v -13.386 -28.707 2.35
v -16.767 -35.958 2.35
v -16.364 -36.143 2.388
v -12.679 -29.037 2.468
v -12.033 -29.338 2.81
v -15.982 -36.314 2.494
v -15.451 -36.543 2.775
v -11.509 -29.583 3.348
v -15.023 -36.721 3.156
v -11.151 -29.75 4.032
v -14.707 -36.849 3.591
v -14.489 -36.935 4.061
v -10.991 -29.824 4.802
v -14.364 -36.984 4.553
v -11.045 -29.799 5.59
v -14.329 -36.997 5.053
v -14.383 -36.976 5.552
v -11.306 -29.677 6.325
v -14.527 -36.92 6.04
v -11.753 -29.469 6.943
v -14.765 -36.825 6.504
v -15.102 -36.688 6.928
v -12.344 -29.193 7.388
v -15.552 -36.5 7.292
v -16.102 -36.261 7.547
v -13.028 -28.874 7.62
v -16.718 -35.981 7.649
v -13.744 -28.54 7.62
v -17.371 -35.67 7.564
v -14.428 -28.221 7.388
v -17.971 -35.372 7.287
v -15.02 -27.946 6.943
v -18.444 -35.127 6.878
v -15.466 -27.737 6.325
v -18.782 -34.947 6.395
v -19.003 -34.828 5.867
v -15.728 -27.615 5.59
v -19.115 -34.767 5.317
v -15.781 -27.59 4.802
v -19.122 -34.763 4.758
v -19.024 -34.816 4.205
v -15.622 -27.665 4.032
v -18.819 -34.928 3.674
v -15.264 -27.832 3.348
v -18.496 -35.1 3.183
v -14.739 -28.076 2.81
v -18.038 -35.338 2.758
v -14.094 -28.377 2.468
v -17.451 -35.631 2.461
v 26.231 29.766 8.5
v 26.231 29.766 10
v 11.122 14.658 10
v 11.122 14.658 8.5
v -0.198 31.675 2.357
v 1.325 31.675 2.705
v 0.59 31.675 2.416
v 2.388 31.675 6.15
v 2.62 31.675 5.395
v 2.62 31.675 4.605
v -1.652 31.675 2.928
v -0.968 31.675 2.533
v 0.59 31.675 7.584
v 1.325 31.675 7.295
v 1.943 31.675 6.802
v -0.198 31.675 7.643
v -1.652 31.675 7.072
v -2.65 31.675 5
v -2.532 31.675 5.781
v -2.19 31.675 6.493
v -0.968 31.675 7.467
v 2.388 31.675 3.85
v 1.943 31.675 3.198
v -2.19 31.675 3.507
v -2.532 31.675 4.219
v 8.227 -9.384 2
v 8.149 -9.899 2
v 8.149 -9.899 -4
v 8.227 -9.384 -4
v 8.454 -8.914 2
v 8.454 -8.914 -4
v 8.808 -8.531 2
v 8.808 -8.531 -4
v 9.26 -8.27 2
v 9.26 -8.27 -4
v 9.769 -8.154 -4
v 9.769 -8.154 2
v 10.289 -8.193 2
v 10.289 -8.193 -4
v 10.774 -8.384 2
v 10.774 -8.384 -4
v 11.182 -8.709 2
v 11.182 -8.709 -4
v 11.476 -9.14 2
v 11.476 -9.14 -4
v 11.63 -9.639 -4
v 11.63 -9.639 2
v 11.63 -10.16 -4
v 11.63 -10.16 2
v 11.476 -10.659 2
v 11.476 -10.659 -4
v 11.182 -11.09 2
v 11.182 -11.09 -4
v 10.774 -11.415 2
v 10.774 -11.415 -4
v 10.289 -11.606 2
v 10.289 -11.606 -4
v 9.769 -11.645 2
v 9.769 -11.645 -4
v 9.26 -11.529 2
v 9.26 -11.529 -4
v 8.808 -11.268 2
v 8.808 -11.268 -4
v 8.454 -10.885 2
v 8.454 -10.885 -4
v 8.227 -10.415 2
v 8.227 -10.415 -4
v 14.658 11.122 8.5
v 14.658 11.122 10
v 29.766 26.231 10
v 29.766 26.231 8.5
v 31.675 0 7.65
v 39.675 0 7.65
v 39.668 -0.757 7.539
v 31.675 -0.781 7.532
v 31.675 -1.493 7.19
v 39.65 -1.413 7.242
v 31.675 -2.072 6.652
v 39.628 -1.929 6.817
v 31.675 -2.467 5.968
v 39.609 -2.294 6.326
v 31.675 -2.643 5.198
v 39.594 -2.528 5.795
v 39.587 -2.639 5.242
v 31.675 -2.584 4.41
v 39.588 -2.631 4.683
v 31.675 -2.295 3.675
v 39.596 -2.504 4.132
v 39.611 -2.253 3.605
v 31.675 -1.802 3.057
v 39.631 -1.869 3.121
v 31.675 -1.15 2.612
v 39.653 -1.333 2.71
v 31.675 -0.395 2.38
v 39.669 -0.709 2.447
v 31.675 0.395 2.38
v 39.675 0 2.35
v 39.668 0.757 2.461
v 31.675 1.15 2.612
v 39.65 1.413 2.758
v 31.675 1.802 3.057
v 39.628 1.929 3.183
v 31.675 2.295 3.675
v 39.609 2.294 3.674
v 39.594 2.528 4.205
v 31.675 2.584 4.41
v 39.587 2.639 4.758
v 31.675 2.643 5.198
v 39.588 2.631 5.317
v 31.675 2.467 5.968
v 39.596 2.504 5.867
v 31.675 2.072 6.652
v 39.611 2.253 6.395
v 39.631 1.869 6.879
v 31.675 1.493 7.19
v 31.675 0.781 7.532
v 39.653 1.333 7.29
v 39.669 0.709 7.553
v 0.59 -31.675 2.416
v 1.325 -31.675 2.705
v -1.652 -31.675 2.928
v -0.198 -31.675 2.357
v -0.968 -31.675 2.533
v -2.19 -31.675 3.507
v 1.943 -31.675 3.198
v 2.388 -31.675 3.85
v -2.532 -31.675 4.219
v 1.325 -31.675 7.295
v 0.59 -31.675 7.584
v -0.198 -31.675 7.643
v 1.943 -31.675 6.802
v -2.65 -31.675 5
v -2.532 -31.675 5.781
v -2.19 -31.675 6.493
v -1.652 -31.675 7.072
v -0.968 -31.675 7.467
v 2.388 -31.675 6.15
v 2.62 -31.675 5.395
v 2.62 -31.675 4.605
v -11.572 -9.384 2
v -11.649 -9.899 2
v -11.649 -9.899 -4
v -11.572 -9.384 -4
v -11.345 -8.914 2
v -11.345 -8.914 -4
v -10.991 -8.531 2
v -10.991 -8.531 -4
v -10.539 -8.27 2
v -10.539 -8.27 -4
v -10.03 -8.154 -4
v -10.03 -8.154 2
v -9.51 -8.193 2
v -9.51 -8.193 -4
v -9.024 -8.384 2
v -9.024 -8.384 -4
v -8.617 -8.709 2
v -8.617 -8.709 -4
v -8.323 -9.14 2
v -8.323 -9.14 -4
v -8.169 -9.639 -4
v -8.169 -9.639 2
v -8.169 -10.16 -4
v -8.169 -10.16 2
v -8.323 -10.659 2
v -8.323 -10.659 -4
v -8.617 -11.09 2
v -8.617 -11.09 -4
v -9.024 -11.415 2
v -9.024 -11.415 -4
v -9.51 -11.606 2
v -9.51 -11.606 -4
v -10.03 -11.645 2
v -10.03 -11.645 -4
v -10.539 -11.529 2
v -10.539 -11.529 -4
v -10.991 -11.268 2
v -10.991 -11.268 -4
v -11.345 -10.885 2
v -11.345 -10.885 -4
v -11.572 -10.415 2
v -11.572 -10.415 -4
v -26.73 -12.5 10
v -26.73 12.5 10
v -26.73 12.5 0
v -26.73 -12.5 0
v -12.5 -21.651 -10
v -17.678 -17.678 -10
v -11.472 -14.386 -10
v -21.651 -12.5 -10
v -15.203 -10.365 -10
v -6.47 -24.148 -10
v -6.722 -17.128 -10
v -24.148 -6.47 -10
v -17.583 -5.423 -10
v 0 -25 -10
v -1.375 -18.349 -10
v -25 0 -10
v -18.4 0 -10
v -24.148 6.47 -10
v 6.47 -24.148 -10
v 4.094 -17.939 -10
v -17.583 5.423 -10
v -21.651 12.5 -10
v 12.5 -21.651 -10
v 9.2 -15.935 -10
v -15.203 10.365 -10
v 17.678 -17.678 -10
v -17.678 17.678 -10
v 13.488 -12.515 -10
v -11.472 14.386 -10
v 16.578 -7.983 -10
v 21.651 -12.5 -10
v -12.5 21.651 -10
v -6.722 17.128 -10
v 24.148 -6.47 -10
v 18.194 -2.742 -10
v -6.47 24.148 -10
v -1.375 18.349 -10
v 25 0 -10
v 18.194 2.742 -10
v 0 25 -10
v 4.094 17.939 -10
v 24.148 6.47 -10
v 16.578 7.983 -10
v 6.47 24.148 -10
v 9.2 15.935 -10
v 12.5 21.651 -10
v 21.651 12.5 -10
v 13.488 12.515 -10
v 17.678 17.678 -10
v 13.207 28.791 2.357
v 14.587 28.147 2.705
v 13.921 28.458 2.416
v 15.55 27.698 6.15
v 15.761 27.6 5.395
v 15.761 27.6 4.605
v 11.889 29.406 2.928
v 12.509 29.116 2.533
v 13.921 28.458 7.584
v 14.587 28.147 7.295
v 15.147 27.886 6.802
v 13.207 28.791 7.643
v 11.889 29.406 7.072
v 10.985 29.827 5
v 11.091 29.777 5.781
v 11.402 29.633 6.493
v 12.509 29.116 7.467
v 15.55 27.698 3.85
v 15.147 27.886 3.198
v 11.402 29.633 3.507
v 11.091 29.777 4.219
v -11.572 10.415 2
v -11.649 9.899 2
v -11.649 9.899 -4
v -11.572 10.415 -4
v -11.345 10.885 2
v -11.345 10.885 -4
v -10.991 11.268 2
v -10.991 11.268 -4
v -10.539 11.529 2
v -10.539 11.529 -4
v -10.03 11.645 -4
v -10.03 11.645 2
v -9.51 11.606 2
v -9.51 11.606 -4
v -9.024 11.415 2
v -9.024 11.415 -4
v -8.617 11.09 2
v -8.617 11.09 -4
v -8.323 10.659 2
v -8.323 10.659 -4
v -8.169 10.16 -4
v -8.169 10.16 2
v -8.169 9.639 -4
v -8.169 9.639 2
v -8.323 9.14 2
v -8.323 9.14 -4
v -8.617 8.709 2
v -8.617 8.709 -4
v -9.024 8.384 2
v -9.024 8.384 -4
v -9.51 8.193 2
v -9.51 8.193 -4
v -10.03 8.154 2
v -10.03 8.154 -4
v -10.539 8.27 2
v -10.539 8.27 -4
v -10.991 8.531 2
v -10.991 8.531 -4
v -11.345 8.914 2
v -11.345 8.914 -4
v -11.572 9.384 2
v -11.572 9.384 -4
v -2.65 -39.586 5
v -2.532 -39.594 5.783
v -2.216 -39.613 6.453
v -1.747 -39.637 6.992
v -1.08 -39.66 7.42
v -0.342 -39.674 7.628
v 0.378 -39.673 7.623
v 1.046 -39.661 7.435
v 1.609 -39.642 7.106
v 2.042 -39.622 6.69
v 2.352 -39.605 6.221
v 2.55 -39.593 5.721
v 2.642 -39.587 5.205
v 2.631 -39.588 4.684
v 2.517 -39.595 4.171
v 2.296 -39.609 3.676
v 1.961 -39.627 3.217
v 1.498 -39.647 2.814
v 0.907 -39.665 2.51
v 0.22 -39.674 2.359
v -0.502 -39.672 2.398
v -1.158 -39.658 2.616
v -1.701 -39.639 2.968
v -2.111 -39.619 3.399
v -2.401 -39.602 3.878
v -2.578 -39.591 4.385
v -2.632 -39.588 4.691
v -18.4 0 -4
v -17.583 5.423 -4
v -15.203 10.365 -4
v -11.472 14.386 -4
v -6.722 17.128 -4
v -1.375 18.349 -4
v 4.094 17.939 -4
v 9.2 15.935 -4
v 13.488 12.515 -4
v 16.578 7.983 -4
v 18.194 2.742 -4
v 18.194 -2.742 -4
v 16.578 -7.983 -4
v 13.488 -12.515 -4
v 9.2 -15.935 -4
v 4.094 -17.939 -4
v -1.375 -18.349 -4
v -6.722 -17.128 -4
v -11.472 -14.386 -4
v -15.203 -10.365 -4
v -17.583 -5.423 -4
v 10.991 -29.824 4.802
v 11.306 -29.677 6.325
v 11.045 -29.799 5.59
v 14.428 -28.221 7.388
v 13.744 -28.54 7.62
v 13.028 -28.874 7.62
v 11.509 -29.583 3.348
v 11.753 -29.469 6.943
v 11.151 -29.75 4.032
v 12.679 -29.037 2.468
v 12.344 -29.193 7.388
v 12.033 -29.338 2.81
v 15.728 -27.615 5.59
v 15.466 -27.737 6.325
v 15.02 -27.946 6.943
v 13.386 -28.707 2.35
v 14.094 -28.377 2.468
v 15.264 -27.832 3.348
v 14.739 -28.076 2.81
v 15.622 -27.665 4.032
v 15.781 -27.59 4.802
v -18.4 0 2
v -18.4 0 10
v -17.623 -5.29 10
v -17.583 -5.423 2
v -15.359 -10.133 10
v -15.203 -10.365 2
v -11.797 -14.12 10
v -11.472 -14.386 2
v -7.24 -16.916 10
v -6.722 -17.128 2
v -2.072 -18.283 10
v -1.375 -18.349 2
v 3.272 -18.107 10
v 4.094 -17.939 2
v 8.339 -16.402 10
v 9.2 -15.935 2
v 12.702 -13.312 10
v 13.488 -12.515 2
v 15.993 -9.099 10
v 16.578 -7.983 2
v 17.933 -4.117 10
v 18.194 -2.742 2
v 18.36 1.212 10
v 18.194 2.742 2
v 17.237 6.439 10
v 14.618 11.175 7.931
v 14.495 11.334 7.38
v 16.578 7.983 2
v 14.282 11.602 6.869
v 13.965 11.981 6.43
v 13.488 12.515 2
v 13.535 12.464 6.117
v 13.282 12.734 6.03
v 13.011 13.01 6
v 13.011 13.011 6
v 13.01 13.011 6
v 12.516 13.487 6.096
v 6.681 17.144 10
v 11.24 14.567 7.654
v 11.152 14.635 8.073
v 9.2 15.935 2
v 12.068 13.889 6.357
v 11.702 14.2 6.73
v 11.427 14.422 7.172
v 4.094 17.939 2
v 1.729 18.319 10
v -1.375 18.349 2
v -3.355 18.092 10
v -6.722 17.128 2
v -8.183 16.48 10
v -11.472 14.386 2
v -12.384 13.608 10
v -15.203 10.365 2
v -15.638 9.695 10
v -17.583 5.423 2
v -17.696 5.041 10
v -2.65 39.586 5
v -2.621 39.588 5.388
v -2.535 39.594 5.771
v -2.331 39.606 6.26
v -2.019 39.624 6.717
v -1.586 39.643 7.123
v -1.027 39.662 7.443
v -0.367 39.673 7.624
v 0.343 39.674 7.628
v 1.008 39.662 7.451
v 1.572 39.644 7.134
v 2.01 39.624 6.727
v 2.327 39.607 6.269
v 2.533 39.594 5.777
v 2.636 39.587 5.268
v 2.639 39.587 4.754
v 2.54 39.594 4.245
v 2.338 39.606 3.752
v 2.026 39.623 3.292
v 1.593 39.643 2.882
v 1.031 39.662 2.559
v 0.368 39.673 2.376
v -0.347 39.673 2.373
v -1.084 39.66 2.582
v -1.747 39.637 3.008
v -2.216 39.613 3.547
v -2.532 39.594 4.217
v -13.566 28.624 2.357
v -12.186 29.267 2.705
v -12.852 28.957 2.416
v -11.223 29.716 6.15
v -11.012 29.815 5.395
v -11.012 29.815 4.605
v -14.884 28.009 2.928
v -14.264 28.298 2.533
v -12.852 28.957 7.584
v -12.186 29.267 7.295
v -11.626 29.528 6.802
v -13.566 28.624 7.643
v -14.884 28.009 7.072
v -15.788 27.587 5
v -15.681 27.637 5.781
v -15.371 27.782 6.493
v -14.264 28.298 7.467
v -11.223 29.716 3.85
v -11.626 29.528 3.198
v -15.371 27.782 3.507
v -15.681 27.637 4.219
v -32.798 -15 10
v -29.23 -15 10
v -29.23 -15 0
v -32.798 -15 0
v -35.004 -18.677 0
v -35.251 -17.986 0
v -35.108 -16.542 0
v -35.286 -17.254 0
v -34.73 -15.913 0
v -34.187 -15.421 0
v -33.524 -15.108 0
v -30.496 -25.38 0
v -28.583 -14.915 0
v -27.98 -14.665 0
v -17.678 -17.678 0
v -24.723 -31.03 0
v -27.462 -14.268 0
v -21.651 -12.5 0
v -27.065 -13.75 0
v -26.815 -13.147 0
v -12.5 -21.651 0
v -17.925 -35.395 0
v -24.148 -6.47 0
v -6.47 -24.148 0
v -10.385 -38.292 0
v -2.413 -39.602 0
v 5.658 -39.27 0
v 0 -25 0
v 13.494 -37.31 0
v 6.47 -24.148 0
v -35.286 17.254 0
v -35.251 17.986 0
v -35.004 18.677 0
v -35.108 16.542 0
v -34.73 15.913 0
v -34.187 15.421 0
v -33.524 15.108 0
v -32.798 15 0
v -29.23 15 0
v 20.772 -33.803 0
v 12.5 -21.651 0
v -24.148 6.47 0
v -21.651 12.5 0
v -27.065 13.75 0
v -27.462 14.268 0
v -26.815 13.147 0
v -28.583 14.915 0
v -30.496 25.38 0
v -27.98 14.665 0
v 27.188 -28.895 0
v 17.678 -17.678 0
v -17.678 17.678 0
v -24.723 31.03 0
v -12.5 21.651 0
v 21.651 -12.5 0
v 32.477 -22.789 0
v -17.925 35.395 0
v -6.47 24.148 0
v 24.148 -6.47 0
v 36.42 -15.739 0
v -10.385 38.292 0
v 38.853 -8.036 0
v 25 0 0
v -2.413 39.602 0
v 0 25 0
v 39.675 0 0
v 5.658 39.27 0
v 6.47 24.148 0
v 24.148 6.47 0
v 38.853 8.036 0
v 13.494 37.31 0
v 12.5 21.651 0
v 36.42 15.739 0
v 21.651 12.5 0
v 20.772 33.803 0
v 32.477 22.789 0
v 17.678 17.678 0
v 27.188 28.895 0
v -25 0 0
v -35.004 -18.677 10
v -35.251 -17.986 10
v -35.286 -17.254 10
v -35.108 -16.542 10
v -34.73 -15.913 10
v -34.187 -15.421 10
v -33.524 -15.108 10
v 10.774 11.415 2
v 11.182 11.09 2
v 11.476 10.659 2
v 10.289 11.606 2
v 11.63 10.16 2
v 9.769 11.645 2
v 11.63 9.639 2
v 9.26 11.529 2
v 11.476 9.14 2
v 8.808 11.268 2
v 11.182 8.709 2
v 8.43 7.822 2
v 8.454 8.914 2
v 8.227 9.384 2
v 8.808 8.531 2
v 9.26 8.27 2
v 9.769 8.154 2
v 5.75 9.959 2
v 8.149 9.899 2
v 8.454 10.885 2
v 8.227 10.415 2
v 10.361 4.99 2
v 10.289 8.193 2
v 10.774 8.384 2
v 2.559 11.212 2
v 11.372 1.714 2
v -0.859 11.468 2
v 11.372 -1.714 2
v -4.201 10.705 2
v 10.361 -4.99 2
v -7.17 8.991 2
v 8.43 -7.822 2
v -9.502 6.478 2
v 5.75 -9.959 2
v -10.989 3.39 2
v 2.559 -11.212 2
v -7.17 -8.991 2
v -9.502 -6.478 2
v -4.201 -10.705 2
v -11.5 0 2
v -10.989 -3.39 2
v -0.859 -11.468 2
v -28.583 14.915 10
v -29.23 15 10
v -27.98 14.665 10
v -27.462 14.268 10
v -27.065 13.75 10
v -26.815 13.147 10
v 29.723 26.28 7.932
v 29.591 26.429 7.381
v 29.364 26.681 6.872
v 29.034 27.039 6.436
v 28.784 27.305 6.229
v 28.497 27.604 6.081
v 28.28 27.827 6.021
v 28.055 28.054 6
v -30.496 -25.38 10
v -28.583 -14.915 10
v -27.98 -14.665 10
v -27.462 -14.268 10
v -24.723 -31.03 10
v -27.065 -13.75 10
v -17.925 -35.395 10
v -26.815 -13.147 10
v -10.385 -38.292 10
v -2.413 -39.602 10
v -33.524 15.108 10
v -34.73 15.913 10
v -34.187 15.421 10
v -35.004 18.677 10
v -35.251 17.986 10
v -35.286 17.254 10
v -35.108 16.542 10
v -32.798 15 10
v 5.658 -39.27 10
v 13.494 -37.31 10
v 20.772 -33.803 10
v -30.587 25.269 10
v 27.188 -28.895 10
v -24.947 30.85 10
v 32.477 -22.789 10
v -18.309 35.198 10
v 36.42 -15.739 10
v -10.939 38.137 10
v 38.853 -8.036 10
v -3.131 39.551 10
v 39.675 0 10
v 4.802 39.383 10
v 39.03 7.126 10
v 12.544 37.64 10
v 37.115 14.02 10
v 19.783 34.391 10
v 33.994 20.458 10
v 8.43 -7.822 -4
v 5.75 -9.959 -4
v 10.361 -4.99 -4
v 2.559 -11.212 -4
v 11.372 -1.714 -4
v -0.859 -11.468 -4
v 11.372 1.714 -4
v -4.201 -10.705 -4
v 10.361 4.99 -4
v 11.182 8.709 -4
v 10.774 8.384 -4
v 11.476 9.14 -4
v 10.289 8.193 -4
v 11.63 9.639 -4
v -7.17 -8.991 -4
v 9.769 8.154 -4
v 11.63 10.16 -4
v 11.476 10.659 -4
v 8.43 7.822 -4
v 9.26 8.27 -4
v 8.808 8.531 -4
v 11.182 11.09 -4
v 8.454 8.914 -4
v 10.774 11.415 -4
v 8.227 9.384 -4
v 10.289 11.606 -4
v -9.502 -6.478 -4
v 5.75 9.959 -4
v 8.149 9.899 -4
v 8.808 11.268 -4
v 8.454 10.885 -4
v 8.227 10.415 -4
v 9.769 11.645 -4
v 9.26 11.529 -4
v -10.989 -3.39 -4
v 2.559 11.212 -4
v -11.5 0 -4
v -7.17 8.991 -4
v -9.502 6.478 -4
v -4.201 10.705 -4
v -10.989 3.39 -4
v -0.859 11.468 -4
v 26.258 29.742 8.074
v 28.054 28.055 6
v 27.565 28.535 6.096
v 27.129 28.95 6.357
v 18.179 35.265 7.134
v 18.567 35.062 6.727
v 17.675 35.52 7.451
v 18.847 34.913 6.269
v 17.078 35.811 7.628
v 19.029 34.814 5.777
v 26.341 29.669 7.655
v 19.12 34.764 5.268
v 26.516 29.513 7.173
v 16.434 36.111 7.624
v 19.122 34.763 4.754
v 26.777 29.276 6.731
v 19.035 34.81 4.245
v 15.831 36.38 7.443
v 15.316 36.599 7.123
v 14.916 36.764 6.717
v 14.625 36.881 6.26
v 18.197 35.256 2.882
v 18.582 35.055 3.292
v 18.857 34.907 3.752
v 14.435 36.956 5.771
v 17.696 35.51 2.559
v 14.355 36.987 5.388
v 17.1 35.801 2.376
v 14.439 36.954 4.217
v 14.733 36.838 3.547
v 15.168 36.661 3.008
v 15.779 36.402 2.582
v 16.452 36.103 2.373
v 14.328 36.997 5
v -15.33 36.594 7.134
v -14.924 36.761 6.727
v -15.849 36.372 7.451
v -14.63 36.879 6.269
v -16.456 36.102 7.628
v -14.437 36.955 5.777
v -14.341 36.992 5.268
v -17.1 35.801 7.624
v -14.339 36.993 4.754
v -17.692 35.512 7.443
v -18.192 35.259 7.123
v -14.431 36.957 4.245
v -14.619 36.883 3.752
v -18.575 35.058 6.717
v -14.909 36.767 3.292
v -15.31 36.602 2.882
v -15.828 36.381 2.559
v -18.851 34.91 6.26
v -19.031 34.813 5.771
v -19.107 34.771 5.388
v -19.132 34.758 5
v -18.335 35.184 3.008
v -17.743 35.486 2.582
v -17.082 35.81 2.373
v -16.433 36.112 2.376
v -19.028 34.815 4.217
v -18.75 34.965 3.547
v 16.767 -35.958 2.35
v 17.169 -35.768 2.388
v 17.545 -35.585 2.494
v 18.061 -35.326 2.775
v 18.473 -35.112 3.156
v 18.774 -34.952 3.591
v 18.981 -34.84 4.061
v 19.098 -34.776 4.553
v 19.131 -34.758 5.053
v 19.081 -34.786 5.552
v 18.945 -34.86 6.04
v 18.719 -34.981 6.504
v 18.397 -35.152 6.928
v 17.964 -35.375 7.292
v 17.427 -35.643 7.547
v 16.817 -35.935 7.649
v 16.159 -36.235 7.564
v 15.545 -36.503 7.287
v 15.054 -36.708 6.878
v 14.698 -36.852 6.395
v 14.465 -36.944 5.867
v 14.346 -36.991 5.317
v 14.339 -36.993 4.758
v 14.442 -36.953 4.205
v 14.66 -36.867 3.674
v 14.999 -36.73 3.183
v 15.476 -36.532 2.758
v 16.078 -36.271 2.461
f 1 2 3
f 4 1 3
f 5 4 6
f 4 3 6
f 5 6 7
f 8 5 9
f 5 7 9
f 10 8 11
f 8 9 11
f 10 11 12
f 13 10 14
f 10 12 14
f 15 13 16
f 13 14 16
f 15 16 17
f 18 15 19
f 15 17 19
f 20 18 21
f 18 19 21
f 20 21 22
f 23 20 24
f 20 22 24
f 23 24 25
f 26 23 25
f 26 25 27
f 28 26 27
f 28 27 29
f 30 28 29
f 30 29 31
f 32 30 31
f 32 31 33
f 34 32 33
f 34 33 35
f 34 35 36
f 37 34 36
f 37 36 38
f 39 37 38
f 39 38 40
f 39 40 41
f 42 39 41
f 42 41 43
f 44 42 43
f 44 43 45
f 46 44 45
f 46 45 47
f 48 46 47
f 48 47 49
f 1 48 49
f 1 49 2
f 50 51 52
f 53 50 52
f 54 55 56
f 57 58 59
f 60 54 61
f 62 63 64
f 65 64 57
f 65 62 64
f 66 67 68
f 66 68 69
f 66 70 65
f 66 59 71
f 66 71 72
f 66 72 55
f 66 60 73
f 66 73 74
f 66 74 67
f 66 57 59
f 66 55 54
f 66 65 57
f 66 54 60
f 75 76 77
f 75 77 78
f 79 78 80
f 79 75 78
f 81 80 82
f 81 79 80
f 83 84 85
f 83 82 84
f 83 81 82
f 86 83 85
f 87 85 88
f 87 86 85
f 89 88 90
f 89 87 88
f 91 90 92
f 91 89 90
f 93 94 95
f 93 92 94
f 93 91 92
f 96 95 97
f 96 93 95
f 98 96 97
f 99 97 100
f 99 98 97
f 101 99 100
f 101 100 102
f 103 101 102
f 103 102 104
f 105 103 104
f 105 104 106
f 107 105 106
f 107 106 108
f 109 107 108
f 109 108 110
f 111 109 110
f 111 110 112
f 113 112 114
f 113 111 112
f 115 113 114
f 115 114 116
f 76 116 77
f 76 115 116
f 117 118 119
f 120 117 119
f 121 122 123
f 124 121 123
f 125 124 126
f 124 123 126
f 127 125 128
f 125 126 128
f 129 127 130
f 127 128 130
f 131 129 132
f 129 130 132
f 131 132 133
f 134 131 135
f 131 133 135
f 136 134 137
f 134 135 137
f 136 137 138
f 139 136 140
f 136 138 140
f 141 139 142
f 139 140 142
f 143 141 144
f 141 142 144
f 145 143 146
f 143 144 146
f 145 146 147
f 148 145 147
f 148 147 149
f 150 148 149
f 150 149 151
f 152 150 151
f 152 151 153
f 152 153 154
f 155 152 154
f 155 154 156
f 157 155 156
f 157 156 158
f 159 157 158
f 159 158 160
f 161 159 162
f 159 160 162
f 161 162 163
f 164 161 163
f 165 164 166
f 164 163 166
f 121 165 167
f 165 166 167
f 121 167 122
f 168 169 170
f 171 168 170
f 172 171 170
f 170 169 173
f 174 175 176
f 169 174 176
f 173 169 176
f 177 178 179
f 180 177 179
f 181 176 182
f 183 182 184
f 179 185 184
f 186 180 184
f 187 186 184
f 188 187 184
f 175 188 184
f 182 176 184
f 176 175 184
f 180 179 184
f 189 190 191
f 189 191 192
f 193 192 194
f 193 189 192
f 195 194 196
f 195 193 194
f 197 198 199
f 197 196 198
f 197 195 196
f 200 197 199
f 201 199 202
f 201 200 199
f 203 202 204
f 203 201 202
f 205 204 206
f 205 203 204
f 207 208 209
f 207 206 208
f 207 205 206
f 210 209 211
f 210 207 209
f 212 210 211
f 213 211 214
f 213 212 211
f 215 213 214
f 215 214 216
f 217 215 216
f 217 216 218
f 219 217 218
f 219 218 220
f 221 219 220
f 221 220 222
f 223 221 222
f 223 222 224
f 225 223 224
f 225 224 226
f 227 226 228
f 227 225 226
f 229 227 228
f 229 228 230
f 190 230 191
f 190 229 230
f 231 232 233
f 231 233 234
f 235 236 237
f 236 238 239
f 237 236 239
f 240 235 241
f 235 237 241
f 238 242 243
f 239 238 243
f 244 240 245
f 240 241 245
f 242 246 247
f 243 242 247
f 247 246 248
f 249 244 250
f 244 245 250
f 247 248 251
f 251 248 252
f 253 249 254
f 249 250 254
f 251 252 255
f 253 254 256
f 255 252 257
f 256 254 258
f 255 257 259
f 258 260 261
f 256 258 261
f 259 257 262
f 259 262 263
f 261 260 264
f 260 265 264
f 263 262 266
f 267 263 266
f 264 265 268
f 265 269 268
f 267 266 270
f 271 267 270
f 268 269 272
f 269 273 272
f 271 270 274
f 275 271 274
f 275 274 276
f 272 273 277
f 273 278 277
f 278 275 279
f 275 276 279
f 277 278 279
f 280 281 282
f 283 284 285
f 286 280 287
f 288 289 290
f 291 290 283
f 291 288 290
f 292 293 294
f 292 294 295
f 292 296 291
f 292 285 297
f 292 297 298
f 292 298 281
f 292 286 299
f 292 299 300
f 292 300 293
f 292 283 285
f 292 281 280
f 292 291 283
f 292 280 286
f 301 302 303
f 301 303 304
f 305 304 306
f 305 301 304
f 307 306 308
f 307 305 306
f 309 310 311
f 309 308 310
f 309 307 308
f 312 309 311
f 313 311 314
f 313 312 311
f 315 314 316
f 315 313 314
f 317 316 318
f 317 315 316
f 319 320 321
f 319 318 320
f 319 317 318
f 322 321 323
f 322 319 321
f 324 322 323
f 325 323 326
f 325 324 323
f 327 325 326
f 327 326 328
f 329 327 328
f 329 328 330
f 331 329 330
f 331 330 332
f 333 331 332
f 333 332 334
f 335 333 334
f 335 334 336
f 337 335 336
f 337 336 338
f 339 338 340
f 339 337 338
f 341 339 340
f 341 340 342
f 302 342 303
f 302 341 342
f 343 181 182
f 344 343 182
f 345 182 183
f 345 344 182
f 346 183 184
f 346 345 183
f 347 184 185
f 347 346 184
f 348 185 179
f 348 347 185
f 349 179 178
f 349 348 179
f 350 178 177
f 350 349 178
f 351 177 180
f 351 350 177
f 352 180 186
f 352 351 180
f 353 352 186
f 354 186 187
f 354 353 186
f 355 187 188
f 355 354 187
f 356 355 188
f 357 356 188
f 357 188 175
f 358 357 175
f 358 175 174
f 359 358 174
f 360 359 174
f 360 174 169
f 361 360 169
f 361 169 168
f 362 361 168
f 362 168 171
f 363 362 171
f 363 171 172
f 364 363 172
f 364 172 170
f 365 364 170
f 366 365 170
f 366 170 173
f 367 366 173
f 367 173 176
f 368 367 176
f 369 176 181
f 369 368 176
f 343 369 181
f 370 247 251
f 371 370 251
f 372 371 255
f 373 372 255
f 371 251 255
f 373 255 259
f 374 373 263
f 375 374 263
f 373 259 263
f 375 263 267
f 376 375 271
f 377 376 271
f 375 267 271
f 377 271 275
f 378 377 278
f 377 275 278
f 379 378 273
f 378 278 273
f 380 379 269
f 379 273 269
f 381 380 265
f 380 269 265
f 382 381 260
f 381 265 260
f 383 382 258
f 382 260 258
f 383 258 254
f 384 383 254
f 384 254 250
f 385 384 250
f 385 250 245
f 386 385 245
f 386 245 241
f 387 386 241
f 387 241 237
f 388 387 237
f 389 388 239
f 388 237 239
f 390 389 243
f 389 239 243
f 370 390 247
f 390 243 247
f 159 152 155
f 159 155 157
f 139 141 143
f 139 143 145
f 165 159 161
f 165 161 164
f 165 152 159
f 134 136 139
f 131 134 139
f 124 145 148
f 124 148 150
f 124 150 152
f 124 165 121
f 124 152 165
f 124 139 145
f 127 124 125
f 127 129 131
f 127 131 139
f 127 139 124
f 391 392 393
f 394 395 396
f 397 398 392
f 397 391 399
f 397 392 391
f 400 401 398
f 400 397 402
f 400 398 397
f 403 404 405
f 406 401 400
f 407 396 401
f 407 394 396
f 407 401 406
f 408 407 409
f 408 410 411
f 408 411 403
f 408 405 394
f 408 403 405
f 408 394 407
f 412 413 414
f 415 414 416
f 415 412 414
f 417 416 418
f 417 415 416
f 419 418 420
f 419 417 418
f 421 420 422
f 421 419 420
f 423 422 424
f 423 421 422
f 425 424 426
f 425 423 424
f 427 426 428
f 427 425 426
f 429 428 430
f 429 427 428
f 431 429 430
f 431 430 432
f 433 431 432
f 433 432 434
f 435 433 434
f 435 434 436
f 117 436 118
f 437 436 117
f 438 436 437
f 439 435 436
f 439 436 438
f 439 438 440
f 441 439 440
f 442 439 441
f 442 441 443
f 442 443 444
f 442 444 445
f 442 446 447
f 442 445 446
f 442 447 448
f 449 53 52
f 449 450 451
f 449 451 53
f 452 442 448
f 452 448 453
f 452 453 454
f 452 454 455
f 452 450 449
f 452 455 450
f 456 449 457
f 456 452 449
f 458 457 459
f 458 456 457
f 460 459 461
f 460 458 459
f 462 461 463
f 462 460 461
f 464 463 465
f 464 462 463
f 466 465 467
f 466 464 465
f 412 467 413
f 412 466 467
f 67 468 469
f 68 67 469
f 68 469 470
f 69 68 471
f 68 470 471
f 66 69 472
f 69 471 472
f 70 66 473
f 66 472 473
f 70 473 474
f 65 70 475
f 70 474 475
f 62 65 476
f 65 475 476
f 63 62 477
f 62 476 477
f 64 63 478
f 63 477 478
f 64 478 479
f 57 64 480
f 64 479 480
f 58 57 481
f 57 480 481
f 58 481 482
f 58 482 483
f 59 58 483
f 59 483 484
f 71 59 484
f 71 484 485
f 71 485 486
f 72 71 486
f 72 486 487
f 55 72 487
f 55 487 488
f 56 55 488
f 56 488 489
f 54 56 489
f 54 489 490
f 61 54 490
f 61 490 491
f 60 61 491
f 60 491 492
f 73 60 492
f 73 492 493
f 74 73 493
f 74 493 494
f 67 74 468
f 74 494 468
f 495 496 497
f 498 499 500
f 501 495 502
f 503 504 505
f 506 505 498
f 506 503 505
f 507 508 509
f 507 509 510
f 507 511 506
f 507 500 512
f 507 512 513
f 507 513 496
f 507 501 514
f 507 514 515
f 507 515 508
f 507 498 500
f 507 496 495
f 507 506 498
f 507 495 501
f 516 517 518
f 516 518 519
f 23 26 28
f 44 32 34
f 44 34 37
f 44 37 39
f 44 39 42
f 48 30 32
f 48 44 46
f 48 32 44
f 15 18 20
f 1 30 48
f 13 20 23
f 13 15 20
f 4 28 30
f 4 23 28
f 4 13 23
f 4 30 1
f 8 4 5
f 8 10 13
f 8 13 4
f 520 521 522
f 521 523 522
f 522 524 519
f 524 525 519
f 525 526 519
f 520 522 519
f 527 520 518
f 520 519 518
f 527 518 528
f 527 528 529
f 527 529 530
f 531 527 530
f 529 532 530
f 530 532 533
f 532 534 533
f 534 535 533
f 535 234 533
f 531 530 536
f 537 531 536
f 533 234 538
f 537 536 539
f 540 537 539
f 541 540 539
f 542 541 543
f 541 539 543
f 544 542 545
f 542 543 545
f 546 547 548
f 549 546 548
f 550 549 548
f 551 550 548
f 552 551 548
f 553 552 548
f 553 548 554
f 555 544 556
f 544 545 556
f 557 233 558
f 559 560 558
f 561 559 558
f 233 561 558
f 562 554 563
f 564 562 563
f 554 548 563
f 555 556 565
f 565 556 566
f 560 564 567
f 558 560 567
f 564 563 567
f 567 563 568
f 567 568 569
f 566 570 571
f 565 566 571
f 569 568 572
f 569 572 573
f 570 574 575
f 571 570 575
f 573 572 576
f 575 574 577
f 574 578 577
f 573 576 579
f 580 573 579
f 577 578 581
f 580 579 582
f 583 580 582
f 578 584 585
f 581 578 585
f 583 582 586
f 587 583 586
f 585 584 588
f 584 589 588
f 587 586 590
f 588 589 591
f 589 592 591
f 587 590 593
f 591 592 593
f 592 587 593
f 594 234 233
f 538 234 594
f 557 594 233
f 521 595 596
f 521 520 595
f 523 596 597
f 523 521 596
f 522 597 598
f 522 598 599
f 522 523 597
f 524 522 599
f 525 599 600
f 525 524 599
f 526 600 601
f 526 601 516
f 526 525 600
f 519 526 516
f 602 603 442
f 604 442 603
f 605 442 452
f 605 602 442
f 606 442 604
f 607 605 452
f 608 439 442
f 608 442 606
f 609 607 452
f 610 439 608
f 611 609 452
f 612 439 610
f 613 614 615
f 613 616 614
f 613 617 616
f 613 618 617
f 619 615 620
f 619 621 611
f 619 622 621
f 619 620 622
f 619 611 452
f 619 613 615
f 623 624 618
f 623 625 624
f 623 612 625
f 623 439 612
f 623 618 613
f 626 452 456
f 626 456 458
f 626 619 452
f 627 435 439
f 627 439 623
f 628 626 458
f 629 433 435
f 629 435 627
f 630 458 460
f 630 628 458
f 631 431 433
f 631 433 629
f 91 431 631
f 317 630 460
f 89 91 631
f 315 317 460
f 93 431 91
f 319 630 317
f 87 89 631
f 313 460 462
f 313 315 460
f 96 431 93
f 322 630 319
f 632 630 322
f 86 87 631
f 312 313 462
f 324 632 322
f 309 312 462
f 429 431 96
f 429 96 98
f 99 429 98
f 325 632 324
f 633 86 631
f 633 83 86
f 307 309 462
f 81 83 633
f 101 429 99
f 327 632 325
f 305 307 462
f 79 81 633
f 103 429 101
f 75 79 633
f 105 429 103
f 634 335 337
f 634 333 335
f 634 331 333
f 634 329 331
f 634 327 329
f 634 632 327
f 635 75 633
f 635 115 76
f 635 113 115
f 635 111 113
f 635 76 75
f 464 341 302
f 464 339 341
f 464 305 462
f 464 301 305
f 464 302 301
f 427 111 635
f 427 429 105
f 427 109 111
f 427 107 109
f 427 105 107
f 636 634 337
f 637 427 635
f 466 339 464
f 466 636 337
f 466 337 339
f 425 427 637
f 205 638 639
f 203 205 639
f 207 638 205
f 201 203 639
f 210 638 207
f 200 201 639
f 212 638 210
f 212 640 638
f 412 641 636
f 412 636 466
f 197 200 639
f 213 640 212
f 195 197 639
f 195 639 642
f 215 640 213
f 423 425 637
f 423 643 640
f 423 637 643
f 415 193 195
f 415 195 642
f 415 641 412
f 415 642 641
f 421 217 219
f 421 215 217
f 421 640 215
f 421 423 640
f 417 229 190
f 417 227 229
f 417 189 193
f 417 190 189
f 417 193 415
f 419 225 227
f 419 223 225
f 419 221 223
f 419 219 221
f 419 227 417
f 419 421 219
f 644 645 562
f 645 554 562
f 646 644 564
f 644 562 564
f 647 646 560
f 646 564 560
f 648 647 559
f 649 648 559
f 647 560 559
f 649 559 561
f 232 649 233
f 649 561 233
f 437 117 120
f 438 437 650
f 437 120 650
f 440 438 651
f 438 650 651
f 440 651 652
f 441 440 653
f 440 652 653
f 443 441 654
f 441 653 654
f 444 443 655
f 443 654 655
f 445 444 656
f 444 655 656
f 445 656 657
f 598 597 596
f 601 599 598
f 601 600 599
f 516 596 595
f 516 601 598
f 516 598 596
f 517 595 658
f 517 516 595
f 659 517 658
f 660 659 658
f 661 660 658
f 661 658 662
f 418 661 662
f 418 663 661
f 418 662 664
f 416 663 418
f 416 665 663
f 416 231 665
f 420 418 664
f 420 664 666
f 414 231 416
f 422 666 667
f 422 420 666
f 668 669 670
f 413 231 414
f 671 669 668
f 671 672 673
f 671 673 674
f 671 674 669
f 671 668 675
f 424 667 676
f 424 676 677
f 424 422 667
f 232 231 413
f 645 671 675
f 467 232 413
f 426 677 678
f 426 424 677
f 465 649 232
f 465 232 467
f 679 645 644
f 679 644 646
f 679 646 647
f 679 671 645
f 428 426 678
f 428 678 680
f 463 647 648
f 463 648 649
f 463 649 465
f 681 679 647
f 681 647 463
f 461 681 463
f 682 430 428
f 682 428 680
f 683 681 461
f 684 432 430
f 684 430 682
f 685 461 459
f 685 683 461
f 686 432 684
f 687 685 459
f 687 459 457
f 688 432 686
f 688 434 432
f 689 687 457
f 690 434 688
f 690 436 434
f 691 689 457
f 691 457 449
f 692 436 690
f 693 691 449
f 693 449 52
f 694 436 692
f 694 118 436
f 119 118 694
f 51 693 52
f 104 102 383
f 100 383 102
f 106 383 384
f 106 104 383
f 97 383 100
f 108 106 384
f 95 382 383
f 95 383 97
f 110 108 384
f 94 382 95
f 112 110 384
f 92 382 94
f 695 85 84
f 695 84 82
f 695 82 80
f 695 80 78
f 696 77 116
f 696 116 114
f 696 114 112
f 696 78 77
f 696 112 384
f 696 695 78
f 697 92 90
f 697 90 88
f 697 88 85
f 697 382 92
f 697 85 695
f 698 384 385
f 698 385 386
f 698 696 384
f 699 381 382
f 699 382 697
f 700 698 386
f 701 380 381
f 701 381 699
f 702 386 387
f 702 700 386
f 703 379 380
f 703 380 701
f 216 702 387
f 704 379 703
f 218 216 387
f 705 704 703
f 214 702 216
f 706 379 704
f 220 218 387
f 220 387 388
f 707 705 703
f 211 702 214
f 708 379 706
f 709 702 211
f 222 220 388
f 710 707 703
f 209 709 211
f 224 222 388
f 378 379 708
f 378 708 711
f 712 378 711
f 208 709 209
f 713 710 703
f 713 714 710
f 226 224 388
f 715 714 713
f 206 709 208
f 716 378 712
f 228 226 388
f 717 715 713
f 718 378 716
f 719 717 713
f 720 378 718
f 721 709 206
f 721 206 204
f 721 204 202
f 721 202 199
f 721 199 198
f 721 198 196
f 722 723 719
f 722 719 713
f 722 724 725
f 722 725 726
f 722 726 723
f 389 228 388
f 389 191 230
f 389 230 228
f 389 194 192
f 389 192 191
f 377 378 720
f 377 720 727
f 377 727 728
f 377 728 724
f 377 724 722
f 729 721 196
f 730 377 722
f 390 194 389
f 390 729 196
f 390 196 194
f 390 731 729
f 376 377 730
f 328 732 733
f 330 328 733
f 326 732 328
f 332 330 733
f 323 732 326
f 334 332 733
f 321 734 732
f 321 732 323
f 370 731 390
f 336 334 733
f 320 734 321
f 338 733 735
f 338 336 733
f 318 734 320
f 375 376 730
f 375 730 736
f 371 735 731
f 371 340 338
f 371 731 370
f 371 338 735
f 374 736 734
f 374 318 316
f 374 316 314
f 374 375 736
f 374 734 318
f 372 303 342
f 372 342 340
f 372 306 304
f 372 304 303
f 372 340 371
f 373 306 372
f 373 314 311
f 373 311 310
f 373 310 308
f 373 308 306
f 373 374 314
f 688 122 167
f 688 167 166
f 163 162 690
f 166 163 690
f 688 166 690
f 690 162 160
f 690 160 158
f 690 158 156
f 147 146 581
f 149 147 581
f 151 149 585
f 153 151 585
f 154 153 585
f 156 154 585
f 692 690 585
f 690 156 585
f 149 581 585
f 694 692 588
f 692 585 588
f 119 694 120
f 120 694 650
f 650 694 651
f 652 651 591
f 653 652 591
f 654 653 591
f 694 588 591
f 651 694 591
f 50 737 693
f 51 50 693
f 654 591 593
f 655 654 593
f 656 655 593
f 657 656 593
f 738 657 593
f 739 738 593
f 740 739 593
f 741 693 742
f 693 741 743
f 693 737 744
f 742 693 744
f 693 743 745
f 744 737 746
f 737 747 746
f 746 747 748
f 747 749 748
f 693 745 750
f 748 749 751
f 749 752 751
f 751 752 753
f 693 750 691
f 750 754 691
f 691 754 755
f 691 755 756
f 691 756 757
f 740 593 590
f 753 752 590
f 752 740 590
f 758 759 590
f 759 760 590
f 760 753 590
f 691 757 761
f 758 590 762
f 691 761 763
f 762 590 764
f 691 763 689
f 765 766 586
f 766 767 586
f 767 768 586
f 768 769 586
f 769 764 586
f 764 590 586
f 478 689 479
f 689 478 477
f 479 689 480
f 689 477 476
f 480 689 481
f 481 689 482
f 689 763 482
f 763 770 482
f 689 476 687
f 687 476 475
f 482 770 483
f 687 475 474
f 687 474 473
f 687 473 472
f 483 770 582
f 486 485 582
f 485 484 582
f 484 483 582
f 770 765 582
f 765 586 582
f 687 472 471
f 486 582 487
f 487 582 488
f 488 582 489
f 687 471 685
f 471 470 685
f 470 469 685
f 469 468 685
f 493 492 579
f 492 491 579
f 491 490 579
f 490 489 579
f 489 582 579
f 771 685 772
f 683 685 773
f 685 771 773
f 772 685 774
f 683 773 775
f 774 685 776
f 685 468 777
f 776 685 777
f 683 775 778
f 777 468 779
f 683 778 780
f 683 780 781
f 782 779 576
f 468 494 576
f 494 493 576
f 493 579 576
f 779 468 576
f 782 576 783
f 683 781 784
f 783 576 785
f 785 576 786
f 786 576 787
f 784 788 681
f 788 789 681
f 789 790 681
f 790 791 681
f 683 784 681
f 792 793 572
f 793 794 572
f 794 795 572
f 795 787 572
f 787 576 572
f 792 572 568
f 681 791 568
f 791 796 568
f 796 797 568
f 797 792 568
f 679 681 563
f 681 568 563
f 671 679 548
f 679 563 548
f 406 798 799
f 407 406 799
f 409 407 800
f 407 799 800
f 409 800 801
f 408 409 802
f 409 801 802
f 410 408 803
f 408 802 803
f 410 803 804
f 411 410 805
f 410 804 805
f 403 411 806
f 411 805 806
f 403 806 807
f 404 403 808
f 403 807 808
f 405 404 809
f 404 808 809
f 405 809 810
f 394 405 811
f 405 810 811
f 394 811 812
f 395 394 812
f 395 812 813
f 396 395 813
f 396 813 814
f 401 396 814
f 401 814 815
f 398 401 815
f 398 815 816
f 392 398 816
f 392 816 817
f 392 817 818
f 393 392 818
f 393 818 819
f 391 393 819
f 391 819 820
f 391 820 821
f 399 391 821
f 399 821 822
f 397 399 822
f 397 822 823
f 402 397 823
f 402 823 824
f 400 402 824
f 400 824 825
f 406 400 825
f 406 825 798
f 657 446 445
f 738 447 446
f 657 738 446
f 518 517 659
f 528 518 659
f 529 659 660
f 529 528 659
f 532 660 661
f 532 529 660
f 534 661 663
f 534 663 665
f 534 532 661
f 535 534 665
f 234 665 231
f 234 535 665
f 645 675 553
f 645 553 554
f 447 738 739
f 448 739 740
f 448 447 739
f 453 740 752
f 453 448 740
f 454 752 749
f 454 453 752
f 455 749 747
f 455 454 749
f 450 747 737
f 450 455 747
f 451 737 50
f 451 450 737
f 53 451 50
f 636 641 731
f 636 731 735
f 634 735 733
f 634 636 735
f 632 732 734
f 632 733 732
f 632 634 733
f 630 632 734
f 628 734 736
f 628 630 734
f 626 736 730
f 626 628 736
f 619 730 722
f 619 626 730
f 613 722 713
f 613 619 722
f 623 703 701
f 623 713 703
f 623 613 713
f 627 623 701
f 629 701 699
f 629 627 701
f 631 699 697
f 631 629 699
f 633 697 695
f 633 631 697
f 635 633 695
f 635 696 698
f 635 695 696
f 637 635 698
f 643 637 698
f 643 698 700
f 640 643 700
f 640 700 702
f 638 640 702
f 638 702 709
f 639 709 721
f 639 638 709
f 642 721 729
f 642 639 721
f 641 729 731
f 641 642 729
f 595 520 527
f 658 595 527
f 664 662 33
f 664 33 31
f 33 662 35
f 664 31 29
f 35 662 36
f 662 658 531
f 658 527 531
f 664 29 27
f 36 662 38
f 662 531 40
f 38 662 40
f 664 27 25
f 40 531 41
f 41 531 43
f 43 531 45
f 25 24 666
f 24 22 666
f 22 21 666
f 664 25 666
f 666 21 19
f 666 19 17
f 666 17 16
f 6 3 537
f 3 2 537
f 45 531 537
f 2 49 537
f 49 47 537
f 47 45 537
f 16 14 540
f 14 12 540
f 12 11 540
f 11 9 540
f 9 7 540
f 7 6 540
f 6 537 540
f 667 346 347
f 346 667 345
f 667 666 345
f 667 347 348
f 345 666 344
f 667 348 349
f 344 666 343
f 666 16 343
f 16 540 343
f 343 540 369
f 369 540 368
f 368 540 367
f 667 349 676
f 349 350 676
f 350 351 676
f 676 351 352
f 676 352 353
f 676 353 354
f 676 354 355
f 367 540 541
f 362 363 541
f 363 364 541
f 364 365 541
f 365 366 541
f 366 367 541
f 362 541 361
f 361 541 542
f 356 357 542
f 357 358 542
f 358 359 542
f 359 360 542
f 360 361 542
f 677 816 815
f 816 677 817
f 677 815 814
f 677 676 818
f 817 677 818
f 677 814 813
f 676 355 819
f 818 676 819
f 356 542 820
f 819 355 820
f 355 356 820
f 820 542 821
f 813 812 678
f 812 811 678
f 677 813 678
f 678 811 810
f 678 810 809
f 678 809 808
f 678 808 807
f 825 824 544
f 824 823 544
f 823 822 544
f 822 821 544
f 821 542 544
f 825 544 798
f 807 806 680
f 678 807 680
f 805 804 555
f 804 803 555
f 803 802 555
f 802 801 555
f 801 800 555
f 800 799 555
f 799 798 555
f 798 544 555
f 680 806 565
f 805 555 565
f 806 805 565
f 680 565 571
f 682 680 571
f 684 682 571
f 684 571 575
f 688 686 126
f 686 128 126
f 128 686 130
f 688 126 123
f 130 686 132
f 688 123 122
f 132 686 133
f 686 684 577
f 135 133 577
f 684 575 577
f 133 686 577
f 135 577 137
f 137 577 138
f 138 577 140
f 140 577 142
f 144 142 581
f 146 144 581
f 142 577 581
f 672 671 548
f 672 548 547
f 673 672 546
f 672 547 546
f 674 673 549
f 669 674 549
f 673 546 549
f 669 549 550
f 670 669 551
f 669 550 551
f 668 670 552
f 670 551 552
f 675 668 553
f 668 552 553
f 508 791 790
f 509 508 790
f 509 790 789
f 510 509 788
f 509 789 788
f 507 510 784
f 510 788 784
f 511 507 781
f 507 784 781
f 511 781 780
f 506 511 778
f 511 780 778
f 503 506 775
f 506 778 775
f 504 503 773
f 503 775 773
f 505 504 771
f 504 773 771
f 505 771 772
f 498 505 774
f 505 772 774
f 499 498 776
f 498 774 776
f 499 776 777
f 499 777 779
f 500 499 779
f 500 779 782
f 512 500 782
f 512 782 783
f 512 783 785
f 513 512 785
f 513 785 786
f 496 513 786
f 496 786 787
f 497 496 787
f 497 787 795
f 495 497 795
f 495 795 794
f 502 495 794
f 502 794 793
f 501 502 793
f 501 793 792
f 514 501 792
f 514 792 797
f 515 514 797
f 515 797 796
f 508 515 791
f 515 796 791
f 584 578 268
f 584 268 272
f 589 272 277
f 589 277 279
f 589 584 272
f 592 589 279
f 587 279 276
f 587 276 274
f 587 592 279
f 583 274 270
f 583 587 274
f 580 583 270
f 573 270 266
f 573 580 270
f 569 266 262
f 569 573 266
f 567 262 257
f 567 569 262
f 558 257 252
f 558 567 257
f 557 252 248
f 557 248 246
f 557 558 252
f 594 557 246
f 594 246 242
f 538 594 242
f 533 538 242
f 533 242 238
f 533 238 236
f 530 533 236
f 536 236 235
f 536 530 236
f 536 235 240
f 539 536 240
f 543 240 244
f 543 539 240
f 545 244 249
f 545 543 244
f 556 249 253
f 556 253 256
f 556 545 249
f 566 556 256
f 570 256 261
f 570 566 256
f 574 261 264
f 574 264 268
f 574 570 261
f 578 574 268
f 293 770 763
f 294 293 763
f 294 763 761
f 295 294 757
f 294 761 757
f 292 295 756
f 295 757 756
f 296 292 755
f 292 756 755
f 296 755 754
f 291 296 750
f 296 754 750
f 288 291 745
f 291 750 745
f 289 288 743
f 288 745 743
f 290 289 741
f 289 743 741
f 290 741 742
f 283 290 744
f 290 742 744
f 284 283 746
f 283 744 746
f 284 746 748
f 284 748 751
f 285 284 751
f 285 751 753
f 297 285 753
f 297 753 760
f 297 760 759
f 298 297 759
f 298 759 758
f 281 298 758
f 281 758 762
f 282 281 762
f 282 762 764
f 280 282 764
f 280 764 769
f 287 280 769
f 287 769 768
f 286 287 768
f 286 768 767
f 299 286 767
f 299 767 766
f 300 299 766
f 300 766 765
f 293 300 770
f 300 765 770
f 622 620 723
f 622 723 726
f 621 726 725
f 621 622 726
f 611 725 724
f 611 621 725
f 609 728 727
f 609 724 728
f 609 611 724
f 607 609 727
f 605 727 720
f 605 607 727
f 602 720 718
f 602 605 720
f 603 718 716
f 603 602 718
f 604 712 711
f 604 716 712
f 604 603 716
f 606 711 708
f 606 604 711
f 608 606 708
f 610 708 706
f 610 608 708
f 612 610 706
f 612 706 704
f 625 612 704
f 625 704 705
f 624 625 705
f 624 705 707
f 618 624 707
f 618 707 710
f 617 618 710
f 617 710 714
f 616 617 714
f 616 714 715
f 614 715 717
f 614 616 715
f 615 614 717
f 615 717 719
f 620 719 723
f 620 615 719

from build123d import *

# Parameters (mm, degrees)
SKETCH_1_R                = 39.675
EXTRUDE_1_DEPTH           = 10
SKETCH_7_R                = 2.65
CUT_EXTRUDE_5_DEPTH       = 8
PATTERN_CIRCULAR_1_COUNT  = 2
PATTERN_CIRCULAR_1_ANGLE  = 25
F_1_THE_OTHER_WAY_COUNT   = 2
F_1_THE_OTHER_WAY_ANGLE   = 25
MIRROR_1_COPY_1_SKETCH_R  = 2.65
MIRROR_1_COPY_1_DEPTH     = 8
MIRROR_1_COPY_2_SKETCH_R  = 2.65
MIRROR_1_COPY_2_DEPTH     = 8
SKETCH_9_R                = 2.65
CUT_EXTRUDE_7_DEPTH       = 8
PATTERN_CIRCULAR_2_COUNT  = 2
CUT_EXTRUDE_START         = -10
CUT_EXTRUDE_8_DEPTH       = 10
CUT_EXTRUDE_13_DEPTH      = 4
SKETCH_12_R               = 25
EXTRUDE_2_DEPTH           = 10
CUT_EXTRUDE_16_DEPTH      = 57.993080877
CUT_EXTRUDE_16_DEPTH_BACK = 57.993080877
SKETCH_18_R               = 11.5
SKETCH_18_R_2             = 1.75
SKETCH_19_R               = 18.4
CUT_EXTRUDE_17_DEPTH      = 6
CUT_EXTRUDE_START_2       = -8
SKETCH_20_R               = 18.4
CUT_EXTRUDE_18_DEPTH      = 8
FILLET_2_R                = 2.5


# Read off the part's stored shape, not the designer's step: Вырез-Вытянуть8
with BuildPart() as part:
    # Эскиз1 → Бобышка-Вытянуть1 (new body)
    with BuildSketch(Plane.XY):
        Circle(SKETCH_1_R)
    extrude(amount=EXTRUDE_1_DEPTH)

    # Эскиз7 → Вырез-Вытянуть5 (cut)
    with BuildSketch(Plane(origin=(0, 39.675, 0), x_dir=(0, 0, -1), z_dir=(0, 1, 0))):
        with Locations(Location((-5, 0, 0), (0, 0, 90))):
            Circle(SKETCH_7_R)
    cut_extrude_5 = extrude(amount=-CUT_EXTRUDE_5_DEPTH, mode=Mode.SUBTRACT)

    # Круговой массив1: Вырез-Вытянуть5 ×2 about axis
    pattern_circular_1_axis = Axis((0, 0, 10), (0, 0, -1))
    for i in range(1, PATTERN_CIRCULAR_1_COUNT):
        add(cut_extrude_5.rotate(pattern_circular_1_axis, i * PATTERN_CIRCULAR_1_ANGLE / (PATTERN_CIRCULAR_1_COUNT - 1)), mode=Mode.SUBTRACT)

    # 1 the other way: Вырез-Вытянуть5 ×2 about axis
    f_1_the_other_way_axis = Axis((0, 0, 10), (0, 0, 1))
    for i in range(1, F_1_THE_OTHER_WAY_COUNT):
        add(cut_extrude_5.rotate(f_1_the_other_way_axis, i * F_1_THE_OTHER_WAY_ANGLE / (F_1_THE_OTHER_WAY_COUNT - 1)), mode=Mode.SUBTRACT)

    # Зеркальное отражение1: Вырез-Вытянуть5 across plane
    add(cut_extrude_5.mirror(Plane.ZX), mode=Mode.SUBTRACT)

    # Зеркальное отражение1 copy 1 sketch → Зеркальное отражение1 copy 1 (cut)
    with BuildSketch(Plane(origin=(16.767379535, -35.957761451, 0), x_dir=(0, 0, -1), z_dir=(0.4226182617407035, -0.906307787036648, 0))):
        with Locations((-5, 0)):
            Circle(MIRROR_1_COPY_1_SKETCH_R)
    extrude(amount=-MIRROR_1_COPY_1_DEPTH, mode=Mode.SUBTRACT)

    # Зеркальное отражение1 copy 2 sketch → Зеркальное отражение1 copy 2 (cut)
    with BuildSketch(Plane(origin=(-16.767379535, -35.957761451, 0), x_dir=(0, 0, -1), z_dir=(-0.42261826174069717, -0.9063077870366509, 0))):
        with Locations((-5, 0)):
            Circle(MIRROR_1_COPY_2_SKETCH_R)
    extrude(amount=-MIRROR_1_COPY_2_DEPTH, mode=Mode.SUBTRACT)

    # Эскиз9 → Вырез-Вытянуть7 (cut)
    with BuildSketch(Plane.ZY.offset(39.675)):
        with Locations((5, 0)):
            Circle(SKETCH_9_R)
    cut_extrude_7 = extrude(amount=-CUT_EXTRUDE_7_DEPTH, mode=Mode.SUBTRACT)

    # Круговой массив2: Вырез-Вытянуть7 ×2 about axis
    pattern_circular_2_axis = Axis((0, 0, 10), (0, 0, -1))
    for i in range(1, PATTERN_CIRCULAR_2_COUNT):
        add(cut_extrude_7.rotate(pattern_circular_2_axis, i * 360 / PATTERN_CIRCULAR_2_COUNT), mode=Mode.SUBTRACT)

    # Вырез-Вытянуть8 outline → Вырез-Вытянуть8 (cut)
    with BuildSketch(Plane(origin=(0, 0, 0), x_dir=(-1, 0, 0), z_dir=(0, 0, -1)).offset(CUT_EXTRUDE_START)):
        with BuildLine():
            Line((36.730173223, 15), (26.730173223, 15))
            Line((26.730173223, 15), (26.730173223, -15))
            Line((26.730173223, -15), (36.730173223, -15))
            ThreePointArc((36.730173223, -15), (39.675, 0), (36.730173223, 15))
        make_face()
    extrude(amount=CUT_EXTRUDE_8_DEPTH, mode=Mode.SUBTRACT)

    # Эскиз15 → Вырез-Вытянуть13 (cut)
    with BuildSketch(Plane.XY.offset(10)):
        Polygon((-1.767766953, 1.767766953), (1.767766953, -1.767766953), (33.587572106, 30.0520382), (30.0520382, 33.587572106), align=None)
    extrude(amount=-CUT_EXTRUDE_13_DEPTH, mode=Mode.SUBTRACT)

    # Эскиз12 → Бобышка-Вытянуть2 (add)
    with BuildSketch(Plane.XY):
        Circle(SKETCH_12_R)
    extrude(amount=-EXTRUDE_2_DEPTH)

    # Эскиз18 → Вырез-Вытянуть16 (cut, two sides: drawn at the far end of the back side and taken through both)
    with BuildSketch(Plane(origin=(0, 0, 0), x_dir=(-1, 0, 0), z_dir=(0, 0, -1)).offset(-CUT_EXTRUDE_16_DEPTH_BACK)):
        Circle(SKETCH_18_R)
        with Locations((9.899494937, 9.899494937)):
            Circle(SKETCH_18_R_2)
        with Locations((9.899494937, -9.899494937)):
            Circle(SKETCH_18_R_2)
        with Locations((-9.899494937, -9.899494937)):
            Circle(SKETCH_18_R_2)
        with Locations((-9.899494937, 9.899494937)):
            Circle(SKETCH_18_R_2)
    extrude(amount=CUT_EXTRUDE_16_DEPTH + CUT_EXTRUDE_16_DEPTH_BACK, mode=Mode.SUBTRACT)

    # Эскиз19 → Вырез-Вытянуть17 (cut)
    with BuildSketch(Plane(origin=(0, 0, -10), x_dir=(-1, 0, 0), z_dir=(0, 0, -1))):
        Circle(SKETCH_19_R)
    extrude(amount=-CUT_EXTRUDE_17_DEPTH, mode=Mode.SUBTRACT)

    # Эскиз20 → Вырез-Вытянуть18 (cut)
    with BuildSketch(Plane.XY.offset(10).offset(CUT_EXTRUDE_START_2)):
        with Locations(Location((0, 0, 0), (0, 0, 180))):
            Circle(SKETCH_20_R)
    extrude(amount=CUT_EXTRUDE_18_DEPTH, mode=Mode.SUBTRACT)

    # Скругление2
    fillet_2_edges = [part.edges().sort_by_distance(p)[0] for p in [
        (18.676644746, 22.212178652, 6),
        (22.212178652, 18.676644746, 6),
        (-26.730173223, 15, 5),
        (-26.730173223, -15, 5),
    ]]
    fillet(fillet_2_edges, radius=FILLET_2_R - 0.0004)  # a hair under: the kernel refuses the full size
    fillet_2_2_edges = [part.edges().sort_by_distance(p)[0] for p in [
        (-36.730173223, -15, 5),
        (-36.730173223, 15, 5),
    ]]
    fillet(fillet_2_2_edges, radius=FILLET_2_R)


solid = part.part
